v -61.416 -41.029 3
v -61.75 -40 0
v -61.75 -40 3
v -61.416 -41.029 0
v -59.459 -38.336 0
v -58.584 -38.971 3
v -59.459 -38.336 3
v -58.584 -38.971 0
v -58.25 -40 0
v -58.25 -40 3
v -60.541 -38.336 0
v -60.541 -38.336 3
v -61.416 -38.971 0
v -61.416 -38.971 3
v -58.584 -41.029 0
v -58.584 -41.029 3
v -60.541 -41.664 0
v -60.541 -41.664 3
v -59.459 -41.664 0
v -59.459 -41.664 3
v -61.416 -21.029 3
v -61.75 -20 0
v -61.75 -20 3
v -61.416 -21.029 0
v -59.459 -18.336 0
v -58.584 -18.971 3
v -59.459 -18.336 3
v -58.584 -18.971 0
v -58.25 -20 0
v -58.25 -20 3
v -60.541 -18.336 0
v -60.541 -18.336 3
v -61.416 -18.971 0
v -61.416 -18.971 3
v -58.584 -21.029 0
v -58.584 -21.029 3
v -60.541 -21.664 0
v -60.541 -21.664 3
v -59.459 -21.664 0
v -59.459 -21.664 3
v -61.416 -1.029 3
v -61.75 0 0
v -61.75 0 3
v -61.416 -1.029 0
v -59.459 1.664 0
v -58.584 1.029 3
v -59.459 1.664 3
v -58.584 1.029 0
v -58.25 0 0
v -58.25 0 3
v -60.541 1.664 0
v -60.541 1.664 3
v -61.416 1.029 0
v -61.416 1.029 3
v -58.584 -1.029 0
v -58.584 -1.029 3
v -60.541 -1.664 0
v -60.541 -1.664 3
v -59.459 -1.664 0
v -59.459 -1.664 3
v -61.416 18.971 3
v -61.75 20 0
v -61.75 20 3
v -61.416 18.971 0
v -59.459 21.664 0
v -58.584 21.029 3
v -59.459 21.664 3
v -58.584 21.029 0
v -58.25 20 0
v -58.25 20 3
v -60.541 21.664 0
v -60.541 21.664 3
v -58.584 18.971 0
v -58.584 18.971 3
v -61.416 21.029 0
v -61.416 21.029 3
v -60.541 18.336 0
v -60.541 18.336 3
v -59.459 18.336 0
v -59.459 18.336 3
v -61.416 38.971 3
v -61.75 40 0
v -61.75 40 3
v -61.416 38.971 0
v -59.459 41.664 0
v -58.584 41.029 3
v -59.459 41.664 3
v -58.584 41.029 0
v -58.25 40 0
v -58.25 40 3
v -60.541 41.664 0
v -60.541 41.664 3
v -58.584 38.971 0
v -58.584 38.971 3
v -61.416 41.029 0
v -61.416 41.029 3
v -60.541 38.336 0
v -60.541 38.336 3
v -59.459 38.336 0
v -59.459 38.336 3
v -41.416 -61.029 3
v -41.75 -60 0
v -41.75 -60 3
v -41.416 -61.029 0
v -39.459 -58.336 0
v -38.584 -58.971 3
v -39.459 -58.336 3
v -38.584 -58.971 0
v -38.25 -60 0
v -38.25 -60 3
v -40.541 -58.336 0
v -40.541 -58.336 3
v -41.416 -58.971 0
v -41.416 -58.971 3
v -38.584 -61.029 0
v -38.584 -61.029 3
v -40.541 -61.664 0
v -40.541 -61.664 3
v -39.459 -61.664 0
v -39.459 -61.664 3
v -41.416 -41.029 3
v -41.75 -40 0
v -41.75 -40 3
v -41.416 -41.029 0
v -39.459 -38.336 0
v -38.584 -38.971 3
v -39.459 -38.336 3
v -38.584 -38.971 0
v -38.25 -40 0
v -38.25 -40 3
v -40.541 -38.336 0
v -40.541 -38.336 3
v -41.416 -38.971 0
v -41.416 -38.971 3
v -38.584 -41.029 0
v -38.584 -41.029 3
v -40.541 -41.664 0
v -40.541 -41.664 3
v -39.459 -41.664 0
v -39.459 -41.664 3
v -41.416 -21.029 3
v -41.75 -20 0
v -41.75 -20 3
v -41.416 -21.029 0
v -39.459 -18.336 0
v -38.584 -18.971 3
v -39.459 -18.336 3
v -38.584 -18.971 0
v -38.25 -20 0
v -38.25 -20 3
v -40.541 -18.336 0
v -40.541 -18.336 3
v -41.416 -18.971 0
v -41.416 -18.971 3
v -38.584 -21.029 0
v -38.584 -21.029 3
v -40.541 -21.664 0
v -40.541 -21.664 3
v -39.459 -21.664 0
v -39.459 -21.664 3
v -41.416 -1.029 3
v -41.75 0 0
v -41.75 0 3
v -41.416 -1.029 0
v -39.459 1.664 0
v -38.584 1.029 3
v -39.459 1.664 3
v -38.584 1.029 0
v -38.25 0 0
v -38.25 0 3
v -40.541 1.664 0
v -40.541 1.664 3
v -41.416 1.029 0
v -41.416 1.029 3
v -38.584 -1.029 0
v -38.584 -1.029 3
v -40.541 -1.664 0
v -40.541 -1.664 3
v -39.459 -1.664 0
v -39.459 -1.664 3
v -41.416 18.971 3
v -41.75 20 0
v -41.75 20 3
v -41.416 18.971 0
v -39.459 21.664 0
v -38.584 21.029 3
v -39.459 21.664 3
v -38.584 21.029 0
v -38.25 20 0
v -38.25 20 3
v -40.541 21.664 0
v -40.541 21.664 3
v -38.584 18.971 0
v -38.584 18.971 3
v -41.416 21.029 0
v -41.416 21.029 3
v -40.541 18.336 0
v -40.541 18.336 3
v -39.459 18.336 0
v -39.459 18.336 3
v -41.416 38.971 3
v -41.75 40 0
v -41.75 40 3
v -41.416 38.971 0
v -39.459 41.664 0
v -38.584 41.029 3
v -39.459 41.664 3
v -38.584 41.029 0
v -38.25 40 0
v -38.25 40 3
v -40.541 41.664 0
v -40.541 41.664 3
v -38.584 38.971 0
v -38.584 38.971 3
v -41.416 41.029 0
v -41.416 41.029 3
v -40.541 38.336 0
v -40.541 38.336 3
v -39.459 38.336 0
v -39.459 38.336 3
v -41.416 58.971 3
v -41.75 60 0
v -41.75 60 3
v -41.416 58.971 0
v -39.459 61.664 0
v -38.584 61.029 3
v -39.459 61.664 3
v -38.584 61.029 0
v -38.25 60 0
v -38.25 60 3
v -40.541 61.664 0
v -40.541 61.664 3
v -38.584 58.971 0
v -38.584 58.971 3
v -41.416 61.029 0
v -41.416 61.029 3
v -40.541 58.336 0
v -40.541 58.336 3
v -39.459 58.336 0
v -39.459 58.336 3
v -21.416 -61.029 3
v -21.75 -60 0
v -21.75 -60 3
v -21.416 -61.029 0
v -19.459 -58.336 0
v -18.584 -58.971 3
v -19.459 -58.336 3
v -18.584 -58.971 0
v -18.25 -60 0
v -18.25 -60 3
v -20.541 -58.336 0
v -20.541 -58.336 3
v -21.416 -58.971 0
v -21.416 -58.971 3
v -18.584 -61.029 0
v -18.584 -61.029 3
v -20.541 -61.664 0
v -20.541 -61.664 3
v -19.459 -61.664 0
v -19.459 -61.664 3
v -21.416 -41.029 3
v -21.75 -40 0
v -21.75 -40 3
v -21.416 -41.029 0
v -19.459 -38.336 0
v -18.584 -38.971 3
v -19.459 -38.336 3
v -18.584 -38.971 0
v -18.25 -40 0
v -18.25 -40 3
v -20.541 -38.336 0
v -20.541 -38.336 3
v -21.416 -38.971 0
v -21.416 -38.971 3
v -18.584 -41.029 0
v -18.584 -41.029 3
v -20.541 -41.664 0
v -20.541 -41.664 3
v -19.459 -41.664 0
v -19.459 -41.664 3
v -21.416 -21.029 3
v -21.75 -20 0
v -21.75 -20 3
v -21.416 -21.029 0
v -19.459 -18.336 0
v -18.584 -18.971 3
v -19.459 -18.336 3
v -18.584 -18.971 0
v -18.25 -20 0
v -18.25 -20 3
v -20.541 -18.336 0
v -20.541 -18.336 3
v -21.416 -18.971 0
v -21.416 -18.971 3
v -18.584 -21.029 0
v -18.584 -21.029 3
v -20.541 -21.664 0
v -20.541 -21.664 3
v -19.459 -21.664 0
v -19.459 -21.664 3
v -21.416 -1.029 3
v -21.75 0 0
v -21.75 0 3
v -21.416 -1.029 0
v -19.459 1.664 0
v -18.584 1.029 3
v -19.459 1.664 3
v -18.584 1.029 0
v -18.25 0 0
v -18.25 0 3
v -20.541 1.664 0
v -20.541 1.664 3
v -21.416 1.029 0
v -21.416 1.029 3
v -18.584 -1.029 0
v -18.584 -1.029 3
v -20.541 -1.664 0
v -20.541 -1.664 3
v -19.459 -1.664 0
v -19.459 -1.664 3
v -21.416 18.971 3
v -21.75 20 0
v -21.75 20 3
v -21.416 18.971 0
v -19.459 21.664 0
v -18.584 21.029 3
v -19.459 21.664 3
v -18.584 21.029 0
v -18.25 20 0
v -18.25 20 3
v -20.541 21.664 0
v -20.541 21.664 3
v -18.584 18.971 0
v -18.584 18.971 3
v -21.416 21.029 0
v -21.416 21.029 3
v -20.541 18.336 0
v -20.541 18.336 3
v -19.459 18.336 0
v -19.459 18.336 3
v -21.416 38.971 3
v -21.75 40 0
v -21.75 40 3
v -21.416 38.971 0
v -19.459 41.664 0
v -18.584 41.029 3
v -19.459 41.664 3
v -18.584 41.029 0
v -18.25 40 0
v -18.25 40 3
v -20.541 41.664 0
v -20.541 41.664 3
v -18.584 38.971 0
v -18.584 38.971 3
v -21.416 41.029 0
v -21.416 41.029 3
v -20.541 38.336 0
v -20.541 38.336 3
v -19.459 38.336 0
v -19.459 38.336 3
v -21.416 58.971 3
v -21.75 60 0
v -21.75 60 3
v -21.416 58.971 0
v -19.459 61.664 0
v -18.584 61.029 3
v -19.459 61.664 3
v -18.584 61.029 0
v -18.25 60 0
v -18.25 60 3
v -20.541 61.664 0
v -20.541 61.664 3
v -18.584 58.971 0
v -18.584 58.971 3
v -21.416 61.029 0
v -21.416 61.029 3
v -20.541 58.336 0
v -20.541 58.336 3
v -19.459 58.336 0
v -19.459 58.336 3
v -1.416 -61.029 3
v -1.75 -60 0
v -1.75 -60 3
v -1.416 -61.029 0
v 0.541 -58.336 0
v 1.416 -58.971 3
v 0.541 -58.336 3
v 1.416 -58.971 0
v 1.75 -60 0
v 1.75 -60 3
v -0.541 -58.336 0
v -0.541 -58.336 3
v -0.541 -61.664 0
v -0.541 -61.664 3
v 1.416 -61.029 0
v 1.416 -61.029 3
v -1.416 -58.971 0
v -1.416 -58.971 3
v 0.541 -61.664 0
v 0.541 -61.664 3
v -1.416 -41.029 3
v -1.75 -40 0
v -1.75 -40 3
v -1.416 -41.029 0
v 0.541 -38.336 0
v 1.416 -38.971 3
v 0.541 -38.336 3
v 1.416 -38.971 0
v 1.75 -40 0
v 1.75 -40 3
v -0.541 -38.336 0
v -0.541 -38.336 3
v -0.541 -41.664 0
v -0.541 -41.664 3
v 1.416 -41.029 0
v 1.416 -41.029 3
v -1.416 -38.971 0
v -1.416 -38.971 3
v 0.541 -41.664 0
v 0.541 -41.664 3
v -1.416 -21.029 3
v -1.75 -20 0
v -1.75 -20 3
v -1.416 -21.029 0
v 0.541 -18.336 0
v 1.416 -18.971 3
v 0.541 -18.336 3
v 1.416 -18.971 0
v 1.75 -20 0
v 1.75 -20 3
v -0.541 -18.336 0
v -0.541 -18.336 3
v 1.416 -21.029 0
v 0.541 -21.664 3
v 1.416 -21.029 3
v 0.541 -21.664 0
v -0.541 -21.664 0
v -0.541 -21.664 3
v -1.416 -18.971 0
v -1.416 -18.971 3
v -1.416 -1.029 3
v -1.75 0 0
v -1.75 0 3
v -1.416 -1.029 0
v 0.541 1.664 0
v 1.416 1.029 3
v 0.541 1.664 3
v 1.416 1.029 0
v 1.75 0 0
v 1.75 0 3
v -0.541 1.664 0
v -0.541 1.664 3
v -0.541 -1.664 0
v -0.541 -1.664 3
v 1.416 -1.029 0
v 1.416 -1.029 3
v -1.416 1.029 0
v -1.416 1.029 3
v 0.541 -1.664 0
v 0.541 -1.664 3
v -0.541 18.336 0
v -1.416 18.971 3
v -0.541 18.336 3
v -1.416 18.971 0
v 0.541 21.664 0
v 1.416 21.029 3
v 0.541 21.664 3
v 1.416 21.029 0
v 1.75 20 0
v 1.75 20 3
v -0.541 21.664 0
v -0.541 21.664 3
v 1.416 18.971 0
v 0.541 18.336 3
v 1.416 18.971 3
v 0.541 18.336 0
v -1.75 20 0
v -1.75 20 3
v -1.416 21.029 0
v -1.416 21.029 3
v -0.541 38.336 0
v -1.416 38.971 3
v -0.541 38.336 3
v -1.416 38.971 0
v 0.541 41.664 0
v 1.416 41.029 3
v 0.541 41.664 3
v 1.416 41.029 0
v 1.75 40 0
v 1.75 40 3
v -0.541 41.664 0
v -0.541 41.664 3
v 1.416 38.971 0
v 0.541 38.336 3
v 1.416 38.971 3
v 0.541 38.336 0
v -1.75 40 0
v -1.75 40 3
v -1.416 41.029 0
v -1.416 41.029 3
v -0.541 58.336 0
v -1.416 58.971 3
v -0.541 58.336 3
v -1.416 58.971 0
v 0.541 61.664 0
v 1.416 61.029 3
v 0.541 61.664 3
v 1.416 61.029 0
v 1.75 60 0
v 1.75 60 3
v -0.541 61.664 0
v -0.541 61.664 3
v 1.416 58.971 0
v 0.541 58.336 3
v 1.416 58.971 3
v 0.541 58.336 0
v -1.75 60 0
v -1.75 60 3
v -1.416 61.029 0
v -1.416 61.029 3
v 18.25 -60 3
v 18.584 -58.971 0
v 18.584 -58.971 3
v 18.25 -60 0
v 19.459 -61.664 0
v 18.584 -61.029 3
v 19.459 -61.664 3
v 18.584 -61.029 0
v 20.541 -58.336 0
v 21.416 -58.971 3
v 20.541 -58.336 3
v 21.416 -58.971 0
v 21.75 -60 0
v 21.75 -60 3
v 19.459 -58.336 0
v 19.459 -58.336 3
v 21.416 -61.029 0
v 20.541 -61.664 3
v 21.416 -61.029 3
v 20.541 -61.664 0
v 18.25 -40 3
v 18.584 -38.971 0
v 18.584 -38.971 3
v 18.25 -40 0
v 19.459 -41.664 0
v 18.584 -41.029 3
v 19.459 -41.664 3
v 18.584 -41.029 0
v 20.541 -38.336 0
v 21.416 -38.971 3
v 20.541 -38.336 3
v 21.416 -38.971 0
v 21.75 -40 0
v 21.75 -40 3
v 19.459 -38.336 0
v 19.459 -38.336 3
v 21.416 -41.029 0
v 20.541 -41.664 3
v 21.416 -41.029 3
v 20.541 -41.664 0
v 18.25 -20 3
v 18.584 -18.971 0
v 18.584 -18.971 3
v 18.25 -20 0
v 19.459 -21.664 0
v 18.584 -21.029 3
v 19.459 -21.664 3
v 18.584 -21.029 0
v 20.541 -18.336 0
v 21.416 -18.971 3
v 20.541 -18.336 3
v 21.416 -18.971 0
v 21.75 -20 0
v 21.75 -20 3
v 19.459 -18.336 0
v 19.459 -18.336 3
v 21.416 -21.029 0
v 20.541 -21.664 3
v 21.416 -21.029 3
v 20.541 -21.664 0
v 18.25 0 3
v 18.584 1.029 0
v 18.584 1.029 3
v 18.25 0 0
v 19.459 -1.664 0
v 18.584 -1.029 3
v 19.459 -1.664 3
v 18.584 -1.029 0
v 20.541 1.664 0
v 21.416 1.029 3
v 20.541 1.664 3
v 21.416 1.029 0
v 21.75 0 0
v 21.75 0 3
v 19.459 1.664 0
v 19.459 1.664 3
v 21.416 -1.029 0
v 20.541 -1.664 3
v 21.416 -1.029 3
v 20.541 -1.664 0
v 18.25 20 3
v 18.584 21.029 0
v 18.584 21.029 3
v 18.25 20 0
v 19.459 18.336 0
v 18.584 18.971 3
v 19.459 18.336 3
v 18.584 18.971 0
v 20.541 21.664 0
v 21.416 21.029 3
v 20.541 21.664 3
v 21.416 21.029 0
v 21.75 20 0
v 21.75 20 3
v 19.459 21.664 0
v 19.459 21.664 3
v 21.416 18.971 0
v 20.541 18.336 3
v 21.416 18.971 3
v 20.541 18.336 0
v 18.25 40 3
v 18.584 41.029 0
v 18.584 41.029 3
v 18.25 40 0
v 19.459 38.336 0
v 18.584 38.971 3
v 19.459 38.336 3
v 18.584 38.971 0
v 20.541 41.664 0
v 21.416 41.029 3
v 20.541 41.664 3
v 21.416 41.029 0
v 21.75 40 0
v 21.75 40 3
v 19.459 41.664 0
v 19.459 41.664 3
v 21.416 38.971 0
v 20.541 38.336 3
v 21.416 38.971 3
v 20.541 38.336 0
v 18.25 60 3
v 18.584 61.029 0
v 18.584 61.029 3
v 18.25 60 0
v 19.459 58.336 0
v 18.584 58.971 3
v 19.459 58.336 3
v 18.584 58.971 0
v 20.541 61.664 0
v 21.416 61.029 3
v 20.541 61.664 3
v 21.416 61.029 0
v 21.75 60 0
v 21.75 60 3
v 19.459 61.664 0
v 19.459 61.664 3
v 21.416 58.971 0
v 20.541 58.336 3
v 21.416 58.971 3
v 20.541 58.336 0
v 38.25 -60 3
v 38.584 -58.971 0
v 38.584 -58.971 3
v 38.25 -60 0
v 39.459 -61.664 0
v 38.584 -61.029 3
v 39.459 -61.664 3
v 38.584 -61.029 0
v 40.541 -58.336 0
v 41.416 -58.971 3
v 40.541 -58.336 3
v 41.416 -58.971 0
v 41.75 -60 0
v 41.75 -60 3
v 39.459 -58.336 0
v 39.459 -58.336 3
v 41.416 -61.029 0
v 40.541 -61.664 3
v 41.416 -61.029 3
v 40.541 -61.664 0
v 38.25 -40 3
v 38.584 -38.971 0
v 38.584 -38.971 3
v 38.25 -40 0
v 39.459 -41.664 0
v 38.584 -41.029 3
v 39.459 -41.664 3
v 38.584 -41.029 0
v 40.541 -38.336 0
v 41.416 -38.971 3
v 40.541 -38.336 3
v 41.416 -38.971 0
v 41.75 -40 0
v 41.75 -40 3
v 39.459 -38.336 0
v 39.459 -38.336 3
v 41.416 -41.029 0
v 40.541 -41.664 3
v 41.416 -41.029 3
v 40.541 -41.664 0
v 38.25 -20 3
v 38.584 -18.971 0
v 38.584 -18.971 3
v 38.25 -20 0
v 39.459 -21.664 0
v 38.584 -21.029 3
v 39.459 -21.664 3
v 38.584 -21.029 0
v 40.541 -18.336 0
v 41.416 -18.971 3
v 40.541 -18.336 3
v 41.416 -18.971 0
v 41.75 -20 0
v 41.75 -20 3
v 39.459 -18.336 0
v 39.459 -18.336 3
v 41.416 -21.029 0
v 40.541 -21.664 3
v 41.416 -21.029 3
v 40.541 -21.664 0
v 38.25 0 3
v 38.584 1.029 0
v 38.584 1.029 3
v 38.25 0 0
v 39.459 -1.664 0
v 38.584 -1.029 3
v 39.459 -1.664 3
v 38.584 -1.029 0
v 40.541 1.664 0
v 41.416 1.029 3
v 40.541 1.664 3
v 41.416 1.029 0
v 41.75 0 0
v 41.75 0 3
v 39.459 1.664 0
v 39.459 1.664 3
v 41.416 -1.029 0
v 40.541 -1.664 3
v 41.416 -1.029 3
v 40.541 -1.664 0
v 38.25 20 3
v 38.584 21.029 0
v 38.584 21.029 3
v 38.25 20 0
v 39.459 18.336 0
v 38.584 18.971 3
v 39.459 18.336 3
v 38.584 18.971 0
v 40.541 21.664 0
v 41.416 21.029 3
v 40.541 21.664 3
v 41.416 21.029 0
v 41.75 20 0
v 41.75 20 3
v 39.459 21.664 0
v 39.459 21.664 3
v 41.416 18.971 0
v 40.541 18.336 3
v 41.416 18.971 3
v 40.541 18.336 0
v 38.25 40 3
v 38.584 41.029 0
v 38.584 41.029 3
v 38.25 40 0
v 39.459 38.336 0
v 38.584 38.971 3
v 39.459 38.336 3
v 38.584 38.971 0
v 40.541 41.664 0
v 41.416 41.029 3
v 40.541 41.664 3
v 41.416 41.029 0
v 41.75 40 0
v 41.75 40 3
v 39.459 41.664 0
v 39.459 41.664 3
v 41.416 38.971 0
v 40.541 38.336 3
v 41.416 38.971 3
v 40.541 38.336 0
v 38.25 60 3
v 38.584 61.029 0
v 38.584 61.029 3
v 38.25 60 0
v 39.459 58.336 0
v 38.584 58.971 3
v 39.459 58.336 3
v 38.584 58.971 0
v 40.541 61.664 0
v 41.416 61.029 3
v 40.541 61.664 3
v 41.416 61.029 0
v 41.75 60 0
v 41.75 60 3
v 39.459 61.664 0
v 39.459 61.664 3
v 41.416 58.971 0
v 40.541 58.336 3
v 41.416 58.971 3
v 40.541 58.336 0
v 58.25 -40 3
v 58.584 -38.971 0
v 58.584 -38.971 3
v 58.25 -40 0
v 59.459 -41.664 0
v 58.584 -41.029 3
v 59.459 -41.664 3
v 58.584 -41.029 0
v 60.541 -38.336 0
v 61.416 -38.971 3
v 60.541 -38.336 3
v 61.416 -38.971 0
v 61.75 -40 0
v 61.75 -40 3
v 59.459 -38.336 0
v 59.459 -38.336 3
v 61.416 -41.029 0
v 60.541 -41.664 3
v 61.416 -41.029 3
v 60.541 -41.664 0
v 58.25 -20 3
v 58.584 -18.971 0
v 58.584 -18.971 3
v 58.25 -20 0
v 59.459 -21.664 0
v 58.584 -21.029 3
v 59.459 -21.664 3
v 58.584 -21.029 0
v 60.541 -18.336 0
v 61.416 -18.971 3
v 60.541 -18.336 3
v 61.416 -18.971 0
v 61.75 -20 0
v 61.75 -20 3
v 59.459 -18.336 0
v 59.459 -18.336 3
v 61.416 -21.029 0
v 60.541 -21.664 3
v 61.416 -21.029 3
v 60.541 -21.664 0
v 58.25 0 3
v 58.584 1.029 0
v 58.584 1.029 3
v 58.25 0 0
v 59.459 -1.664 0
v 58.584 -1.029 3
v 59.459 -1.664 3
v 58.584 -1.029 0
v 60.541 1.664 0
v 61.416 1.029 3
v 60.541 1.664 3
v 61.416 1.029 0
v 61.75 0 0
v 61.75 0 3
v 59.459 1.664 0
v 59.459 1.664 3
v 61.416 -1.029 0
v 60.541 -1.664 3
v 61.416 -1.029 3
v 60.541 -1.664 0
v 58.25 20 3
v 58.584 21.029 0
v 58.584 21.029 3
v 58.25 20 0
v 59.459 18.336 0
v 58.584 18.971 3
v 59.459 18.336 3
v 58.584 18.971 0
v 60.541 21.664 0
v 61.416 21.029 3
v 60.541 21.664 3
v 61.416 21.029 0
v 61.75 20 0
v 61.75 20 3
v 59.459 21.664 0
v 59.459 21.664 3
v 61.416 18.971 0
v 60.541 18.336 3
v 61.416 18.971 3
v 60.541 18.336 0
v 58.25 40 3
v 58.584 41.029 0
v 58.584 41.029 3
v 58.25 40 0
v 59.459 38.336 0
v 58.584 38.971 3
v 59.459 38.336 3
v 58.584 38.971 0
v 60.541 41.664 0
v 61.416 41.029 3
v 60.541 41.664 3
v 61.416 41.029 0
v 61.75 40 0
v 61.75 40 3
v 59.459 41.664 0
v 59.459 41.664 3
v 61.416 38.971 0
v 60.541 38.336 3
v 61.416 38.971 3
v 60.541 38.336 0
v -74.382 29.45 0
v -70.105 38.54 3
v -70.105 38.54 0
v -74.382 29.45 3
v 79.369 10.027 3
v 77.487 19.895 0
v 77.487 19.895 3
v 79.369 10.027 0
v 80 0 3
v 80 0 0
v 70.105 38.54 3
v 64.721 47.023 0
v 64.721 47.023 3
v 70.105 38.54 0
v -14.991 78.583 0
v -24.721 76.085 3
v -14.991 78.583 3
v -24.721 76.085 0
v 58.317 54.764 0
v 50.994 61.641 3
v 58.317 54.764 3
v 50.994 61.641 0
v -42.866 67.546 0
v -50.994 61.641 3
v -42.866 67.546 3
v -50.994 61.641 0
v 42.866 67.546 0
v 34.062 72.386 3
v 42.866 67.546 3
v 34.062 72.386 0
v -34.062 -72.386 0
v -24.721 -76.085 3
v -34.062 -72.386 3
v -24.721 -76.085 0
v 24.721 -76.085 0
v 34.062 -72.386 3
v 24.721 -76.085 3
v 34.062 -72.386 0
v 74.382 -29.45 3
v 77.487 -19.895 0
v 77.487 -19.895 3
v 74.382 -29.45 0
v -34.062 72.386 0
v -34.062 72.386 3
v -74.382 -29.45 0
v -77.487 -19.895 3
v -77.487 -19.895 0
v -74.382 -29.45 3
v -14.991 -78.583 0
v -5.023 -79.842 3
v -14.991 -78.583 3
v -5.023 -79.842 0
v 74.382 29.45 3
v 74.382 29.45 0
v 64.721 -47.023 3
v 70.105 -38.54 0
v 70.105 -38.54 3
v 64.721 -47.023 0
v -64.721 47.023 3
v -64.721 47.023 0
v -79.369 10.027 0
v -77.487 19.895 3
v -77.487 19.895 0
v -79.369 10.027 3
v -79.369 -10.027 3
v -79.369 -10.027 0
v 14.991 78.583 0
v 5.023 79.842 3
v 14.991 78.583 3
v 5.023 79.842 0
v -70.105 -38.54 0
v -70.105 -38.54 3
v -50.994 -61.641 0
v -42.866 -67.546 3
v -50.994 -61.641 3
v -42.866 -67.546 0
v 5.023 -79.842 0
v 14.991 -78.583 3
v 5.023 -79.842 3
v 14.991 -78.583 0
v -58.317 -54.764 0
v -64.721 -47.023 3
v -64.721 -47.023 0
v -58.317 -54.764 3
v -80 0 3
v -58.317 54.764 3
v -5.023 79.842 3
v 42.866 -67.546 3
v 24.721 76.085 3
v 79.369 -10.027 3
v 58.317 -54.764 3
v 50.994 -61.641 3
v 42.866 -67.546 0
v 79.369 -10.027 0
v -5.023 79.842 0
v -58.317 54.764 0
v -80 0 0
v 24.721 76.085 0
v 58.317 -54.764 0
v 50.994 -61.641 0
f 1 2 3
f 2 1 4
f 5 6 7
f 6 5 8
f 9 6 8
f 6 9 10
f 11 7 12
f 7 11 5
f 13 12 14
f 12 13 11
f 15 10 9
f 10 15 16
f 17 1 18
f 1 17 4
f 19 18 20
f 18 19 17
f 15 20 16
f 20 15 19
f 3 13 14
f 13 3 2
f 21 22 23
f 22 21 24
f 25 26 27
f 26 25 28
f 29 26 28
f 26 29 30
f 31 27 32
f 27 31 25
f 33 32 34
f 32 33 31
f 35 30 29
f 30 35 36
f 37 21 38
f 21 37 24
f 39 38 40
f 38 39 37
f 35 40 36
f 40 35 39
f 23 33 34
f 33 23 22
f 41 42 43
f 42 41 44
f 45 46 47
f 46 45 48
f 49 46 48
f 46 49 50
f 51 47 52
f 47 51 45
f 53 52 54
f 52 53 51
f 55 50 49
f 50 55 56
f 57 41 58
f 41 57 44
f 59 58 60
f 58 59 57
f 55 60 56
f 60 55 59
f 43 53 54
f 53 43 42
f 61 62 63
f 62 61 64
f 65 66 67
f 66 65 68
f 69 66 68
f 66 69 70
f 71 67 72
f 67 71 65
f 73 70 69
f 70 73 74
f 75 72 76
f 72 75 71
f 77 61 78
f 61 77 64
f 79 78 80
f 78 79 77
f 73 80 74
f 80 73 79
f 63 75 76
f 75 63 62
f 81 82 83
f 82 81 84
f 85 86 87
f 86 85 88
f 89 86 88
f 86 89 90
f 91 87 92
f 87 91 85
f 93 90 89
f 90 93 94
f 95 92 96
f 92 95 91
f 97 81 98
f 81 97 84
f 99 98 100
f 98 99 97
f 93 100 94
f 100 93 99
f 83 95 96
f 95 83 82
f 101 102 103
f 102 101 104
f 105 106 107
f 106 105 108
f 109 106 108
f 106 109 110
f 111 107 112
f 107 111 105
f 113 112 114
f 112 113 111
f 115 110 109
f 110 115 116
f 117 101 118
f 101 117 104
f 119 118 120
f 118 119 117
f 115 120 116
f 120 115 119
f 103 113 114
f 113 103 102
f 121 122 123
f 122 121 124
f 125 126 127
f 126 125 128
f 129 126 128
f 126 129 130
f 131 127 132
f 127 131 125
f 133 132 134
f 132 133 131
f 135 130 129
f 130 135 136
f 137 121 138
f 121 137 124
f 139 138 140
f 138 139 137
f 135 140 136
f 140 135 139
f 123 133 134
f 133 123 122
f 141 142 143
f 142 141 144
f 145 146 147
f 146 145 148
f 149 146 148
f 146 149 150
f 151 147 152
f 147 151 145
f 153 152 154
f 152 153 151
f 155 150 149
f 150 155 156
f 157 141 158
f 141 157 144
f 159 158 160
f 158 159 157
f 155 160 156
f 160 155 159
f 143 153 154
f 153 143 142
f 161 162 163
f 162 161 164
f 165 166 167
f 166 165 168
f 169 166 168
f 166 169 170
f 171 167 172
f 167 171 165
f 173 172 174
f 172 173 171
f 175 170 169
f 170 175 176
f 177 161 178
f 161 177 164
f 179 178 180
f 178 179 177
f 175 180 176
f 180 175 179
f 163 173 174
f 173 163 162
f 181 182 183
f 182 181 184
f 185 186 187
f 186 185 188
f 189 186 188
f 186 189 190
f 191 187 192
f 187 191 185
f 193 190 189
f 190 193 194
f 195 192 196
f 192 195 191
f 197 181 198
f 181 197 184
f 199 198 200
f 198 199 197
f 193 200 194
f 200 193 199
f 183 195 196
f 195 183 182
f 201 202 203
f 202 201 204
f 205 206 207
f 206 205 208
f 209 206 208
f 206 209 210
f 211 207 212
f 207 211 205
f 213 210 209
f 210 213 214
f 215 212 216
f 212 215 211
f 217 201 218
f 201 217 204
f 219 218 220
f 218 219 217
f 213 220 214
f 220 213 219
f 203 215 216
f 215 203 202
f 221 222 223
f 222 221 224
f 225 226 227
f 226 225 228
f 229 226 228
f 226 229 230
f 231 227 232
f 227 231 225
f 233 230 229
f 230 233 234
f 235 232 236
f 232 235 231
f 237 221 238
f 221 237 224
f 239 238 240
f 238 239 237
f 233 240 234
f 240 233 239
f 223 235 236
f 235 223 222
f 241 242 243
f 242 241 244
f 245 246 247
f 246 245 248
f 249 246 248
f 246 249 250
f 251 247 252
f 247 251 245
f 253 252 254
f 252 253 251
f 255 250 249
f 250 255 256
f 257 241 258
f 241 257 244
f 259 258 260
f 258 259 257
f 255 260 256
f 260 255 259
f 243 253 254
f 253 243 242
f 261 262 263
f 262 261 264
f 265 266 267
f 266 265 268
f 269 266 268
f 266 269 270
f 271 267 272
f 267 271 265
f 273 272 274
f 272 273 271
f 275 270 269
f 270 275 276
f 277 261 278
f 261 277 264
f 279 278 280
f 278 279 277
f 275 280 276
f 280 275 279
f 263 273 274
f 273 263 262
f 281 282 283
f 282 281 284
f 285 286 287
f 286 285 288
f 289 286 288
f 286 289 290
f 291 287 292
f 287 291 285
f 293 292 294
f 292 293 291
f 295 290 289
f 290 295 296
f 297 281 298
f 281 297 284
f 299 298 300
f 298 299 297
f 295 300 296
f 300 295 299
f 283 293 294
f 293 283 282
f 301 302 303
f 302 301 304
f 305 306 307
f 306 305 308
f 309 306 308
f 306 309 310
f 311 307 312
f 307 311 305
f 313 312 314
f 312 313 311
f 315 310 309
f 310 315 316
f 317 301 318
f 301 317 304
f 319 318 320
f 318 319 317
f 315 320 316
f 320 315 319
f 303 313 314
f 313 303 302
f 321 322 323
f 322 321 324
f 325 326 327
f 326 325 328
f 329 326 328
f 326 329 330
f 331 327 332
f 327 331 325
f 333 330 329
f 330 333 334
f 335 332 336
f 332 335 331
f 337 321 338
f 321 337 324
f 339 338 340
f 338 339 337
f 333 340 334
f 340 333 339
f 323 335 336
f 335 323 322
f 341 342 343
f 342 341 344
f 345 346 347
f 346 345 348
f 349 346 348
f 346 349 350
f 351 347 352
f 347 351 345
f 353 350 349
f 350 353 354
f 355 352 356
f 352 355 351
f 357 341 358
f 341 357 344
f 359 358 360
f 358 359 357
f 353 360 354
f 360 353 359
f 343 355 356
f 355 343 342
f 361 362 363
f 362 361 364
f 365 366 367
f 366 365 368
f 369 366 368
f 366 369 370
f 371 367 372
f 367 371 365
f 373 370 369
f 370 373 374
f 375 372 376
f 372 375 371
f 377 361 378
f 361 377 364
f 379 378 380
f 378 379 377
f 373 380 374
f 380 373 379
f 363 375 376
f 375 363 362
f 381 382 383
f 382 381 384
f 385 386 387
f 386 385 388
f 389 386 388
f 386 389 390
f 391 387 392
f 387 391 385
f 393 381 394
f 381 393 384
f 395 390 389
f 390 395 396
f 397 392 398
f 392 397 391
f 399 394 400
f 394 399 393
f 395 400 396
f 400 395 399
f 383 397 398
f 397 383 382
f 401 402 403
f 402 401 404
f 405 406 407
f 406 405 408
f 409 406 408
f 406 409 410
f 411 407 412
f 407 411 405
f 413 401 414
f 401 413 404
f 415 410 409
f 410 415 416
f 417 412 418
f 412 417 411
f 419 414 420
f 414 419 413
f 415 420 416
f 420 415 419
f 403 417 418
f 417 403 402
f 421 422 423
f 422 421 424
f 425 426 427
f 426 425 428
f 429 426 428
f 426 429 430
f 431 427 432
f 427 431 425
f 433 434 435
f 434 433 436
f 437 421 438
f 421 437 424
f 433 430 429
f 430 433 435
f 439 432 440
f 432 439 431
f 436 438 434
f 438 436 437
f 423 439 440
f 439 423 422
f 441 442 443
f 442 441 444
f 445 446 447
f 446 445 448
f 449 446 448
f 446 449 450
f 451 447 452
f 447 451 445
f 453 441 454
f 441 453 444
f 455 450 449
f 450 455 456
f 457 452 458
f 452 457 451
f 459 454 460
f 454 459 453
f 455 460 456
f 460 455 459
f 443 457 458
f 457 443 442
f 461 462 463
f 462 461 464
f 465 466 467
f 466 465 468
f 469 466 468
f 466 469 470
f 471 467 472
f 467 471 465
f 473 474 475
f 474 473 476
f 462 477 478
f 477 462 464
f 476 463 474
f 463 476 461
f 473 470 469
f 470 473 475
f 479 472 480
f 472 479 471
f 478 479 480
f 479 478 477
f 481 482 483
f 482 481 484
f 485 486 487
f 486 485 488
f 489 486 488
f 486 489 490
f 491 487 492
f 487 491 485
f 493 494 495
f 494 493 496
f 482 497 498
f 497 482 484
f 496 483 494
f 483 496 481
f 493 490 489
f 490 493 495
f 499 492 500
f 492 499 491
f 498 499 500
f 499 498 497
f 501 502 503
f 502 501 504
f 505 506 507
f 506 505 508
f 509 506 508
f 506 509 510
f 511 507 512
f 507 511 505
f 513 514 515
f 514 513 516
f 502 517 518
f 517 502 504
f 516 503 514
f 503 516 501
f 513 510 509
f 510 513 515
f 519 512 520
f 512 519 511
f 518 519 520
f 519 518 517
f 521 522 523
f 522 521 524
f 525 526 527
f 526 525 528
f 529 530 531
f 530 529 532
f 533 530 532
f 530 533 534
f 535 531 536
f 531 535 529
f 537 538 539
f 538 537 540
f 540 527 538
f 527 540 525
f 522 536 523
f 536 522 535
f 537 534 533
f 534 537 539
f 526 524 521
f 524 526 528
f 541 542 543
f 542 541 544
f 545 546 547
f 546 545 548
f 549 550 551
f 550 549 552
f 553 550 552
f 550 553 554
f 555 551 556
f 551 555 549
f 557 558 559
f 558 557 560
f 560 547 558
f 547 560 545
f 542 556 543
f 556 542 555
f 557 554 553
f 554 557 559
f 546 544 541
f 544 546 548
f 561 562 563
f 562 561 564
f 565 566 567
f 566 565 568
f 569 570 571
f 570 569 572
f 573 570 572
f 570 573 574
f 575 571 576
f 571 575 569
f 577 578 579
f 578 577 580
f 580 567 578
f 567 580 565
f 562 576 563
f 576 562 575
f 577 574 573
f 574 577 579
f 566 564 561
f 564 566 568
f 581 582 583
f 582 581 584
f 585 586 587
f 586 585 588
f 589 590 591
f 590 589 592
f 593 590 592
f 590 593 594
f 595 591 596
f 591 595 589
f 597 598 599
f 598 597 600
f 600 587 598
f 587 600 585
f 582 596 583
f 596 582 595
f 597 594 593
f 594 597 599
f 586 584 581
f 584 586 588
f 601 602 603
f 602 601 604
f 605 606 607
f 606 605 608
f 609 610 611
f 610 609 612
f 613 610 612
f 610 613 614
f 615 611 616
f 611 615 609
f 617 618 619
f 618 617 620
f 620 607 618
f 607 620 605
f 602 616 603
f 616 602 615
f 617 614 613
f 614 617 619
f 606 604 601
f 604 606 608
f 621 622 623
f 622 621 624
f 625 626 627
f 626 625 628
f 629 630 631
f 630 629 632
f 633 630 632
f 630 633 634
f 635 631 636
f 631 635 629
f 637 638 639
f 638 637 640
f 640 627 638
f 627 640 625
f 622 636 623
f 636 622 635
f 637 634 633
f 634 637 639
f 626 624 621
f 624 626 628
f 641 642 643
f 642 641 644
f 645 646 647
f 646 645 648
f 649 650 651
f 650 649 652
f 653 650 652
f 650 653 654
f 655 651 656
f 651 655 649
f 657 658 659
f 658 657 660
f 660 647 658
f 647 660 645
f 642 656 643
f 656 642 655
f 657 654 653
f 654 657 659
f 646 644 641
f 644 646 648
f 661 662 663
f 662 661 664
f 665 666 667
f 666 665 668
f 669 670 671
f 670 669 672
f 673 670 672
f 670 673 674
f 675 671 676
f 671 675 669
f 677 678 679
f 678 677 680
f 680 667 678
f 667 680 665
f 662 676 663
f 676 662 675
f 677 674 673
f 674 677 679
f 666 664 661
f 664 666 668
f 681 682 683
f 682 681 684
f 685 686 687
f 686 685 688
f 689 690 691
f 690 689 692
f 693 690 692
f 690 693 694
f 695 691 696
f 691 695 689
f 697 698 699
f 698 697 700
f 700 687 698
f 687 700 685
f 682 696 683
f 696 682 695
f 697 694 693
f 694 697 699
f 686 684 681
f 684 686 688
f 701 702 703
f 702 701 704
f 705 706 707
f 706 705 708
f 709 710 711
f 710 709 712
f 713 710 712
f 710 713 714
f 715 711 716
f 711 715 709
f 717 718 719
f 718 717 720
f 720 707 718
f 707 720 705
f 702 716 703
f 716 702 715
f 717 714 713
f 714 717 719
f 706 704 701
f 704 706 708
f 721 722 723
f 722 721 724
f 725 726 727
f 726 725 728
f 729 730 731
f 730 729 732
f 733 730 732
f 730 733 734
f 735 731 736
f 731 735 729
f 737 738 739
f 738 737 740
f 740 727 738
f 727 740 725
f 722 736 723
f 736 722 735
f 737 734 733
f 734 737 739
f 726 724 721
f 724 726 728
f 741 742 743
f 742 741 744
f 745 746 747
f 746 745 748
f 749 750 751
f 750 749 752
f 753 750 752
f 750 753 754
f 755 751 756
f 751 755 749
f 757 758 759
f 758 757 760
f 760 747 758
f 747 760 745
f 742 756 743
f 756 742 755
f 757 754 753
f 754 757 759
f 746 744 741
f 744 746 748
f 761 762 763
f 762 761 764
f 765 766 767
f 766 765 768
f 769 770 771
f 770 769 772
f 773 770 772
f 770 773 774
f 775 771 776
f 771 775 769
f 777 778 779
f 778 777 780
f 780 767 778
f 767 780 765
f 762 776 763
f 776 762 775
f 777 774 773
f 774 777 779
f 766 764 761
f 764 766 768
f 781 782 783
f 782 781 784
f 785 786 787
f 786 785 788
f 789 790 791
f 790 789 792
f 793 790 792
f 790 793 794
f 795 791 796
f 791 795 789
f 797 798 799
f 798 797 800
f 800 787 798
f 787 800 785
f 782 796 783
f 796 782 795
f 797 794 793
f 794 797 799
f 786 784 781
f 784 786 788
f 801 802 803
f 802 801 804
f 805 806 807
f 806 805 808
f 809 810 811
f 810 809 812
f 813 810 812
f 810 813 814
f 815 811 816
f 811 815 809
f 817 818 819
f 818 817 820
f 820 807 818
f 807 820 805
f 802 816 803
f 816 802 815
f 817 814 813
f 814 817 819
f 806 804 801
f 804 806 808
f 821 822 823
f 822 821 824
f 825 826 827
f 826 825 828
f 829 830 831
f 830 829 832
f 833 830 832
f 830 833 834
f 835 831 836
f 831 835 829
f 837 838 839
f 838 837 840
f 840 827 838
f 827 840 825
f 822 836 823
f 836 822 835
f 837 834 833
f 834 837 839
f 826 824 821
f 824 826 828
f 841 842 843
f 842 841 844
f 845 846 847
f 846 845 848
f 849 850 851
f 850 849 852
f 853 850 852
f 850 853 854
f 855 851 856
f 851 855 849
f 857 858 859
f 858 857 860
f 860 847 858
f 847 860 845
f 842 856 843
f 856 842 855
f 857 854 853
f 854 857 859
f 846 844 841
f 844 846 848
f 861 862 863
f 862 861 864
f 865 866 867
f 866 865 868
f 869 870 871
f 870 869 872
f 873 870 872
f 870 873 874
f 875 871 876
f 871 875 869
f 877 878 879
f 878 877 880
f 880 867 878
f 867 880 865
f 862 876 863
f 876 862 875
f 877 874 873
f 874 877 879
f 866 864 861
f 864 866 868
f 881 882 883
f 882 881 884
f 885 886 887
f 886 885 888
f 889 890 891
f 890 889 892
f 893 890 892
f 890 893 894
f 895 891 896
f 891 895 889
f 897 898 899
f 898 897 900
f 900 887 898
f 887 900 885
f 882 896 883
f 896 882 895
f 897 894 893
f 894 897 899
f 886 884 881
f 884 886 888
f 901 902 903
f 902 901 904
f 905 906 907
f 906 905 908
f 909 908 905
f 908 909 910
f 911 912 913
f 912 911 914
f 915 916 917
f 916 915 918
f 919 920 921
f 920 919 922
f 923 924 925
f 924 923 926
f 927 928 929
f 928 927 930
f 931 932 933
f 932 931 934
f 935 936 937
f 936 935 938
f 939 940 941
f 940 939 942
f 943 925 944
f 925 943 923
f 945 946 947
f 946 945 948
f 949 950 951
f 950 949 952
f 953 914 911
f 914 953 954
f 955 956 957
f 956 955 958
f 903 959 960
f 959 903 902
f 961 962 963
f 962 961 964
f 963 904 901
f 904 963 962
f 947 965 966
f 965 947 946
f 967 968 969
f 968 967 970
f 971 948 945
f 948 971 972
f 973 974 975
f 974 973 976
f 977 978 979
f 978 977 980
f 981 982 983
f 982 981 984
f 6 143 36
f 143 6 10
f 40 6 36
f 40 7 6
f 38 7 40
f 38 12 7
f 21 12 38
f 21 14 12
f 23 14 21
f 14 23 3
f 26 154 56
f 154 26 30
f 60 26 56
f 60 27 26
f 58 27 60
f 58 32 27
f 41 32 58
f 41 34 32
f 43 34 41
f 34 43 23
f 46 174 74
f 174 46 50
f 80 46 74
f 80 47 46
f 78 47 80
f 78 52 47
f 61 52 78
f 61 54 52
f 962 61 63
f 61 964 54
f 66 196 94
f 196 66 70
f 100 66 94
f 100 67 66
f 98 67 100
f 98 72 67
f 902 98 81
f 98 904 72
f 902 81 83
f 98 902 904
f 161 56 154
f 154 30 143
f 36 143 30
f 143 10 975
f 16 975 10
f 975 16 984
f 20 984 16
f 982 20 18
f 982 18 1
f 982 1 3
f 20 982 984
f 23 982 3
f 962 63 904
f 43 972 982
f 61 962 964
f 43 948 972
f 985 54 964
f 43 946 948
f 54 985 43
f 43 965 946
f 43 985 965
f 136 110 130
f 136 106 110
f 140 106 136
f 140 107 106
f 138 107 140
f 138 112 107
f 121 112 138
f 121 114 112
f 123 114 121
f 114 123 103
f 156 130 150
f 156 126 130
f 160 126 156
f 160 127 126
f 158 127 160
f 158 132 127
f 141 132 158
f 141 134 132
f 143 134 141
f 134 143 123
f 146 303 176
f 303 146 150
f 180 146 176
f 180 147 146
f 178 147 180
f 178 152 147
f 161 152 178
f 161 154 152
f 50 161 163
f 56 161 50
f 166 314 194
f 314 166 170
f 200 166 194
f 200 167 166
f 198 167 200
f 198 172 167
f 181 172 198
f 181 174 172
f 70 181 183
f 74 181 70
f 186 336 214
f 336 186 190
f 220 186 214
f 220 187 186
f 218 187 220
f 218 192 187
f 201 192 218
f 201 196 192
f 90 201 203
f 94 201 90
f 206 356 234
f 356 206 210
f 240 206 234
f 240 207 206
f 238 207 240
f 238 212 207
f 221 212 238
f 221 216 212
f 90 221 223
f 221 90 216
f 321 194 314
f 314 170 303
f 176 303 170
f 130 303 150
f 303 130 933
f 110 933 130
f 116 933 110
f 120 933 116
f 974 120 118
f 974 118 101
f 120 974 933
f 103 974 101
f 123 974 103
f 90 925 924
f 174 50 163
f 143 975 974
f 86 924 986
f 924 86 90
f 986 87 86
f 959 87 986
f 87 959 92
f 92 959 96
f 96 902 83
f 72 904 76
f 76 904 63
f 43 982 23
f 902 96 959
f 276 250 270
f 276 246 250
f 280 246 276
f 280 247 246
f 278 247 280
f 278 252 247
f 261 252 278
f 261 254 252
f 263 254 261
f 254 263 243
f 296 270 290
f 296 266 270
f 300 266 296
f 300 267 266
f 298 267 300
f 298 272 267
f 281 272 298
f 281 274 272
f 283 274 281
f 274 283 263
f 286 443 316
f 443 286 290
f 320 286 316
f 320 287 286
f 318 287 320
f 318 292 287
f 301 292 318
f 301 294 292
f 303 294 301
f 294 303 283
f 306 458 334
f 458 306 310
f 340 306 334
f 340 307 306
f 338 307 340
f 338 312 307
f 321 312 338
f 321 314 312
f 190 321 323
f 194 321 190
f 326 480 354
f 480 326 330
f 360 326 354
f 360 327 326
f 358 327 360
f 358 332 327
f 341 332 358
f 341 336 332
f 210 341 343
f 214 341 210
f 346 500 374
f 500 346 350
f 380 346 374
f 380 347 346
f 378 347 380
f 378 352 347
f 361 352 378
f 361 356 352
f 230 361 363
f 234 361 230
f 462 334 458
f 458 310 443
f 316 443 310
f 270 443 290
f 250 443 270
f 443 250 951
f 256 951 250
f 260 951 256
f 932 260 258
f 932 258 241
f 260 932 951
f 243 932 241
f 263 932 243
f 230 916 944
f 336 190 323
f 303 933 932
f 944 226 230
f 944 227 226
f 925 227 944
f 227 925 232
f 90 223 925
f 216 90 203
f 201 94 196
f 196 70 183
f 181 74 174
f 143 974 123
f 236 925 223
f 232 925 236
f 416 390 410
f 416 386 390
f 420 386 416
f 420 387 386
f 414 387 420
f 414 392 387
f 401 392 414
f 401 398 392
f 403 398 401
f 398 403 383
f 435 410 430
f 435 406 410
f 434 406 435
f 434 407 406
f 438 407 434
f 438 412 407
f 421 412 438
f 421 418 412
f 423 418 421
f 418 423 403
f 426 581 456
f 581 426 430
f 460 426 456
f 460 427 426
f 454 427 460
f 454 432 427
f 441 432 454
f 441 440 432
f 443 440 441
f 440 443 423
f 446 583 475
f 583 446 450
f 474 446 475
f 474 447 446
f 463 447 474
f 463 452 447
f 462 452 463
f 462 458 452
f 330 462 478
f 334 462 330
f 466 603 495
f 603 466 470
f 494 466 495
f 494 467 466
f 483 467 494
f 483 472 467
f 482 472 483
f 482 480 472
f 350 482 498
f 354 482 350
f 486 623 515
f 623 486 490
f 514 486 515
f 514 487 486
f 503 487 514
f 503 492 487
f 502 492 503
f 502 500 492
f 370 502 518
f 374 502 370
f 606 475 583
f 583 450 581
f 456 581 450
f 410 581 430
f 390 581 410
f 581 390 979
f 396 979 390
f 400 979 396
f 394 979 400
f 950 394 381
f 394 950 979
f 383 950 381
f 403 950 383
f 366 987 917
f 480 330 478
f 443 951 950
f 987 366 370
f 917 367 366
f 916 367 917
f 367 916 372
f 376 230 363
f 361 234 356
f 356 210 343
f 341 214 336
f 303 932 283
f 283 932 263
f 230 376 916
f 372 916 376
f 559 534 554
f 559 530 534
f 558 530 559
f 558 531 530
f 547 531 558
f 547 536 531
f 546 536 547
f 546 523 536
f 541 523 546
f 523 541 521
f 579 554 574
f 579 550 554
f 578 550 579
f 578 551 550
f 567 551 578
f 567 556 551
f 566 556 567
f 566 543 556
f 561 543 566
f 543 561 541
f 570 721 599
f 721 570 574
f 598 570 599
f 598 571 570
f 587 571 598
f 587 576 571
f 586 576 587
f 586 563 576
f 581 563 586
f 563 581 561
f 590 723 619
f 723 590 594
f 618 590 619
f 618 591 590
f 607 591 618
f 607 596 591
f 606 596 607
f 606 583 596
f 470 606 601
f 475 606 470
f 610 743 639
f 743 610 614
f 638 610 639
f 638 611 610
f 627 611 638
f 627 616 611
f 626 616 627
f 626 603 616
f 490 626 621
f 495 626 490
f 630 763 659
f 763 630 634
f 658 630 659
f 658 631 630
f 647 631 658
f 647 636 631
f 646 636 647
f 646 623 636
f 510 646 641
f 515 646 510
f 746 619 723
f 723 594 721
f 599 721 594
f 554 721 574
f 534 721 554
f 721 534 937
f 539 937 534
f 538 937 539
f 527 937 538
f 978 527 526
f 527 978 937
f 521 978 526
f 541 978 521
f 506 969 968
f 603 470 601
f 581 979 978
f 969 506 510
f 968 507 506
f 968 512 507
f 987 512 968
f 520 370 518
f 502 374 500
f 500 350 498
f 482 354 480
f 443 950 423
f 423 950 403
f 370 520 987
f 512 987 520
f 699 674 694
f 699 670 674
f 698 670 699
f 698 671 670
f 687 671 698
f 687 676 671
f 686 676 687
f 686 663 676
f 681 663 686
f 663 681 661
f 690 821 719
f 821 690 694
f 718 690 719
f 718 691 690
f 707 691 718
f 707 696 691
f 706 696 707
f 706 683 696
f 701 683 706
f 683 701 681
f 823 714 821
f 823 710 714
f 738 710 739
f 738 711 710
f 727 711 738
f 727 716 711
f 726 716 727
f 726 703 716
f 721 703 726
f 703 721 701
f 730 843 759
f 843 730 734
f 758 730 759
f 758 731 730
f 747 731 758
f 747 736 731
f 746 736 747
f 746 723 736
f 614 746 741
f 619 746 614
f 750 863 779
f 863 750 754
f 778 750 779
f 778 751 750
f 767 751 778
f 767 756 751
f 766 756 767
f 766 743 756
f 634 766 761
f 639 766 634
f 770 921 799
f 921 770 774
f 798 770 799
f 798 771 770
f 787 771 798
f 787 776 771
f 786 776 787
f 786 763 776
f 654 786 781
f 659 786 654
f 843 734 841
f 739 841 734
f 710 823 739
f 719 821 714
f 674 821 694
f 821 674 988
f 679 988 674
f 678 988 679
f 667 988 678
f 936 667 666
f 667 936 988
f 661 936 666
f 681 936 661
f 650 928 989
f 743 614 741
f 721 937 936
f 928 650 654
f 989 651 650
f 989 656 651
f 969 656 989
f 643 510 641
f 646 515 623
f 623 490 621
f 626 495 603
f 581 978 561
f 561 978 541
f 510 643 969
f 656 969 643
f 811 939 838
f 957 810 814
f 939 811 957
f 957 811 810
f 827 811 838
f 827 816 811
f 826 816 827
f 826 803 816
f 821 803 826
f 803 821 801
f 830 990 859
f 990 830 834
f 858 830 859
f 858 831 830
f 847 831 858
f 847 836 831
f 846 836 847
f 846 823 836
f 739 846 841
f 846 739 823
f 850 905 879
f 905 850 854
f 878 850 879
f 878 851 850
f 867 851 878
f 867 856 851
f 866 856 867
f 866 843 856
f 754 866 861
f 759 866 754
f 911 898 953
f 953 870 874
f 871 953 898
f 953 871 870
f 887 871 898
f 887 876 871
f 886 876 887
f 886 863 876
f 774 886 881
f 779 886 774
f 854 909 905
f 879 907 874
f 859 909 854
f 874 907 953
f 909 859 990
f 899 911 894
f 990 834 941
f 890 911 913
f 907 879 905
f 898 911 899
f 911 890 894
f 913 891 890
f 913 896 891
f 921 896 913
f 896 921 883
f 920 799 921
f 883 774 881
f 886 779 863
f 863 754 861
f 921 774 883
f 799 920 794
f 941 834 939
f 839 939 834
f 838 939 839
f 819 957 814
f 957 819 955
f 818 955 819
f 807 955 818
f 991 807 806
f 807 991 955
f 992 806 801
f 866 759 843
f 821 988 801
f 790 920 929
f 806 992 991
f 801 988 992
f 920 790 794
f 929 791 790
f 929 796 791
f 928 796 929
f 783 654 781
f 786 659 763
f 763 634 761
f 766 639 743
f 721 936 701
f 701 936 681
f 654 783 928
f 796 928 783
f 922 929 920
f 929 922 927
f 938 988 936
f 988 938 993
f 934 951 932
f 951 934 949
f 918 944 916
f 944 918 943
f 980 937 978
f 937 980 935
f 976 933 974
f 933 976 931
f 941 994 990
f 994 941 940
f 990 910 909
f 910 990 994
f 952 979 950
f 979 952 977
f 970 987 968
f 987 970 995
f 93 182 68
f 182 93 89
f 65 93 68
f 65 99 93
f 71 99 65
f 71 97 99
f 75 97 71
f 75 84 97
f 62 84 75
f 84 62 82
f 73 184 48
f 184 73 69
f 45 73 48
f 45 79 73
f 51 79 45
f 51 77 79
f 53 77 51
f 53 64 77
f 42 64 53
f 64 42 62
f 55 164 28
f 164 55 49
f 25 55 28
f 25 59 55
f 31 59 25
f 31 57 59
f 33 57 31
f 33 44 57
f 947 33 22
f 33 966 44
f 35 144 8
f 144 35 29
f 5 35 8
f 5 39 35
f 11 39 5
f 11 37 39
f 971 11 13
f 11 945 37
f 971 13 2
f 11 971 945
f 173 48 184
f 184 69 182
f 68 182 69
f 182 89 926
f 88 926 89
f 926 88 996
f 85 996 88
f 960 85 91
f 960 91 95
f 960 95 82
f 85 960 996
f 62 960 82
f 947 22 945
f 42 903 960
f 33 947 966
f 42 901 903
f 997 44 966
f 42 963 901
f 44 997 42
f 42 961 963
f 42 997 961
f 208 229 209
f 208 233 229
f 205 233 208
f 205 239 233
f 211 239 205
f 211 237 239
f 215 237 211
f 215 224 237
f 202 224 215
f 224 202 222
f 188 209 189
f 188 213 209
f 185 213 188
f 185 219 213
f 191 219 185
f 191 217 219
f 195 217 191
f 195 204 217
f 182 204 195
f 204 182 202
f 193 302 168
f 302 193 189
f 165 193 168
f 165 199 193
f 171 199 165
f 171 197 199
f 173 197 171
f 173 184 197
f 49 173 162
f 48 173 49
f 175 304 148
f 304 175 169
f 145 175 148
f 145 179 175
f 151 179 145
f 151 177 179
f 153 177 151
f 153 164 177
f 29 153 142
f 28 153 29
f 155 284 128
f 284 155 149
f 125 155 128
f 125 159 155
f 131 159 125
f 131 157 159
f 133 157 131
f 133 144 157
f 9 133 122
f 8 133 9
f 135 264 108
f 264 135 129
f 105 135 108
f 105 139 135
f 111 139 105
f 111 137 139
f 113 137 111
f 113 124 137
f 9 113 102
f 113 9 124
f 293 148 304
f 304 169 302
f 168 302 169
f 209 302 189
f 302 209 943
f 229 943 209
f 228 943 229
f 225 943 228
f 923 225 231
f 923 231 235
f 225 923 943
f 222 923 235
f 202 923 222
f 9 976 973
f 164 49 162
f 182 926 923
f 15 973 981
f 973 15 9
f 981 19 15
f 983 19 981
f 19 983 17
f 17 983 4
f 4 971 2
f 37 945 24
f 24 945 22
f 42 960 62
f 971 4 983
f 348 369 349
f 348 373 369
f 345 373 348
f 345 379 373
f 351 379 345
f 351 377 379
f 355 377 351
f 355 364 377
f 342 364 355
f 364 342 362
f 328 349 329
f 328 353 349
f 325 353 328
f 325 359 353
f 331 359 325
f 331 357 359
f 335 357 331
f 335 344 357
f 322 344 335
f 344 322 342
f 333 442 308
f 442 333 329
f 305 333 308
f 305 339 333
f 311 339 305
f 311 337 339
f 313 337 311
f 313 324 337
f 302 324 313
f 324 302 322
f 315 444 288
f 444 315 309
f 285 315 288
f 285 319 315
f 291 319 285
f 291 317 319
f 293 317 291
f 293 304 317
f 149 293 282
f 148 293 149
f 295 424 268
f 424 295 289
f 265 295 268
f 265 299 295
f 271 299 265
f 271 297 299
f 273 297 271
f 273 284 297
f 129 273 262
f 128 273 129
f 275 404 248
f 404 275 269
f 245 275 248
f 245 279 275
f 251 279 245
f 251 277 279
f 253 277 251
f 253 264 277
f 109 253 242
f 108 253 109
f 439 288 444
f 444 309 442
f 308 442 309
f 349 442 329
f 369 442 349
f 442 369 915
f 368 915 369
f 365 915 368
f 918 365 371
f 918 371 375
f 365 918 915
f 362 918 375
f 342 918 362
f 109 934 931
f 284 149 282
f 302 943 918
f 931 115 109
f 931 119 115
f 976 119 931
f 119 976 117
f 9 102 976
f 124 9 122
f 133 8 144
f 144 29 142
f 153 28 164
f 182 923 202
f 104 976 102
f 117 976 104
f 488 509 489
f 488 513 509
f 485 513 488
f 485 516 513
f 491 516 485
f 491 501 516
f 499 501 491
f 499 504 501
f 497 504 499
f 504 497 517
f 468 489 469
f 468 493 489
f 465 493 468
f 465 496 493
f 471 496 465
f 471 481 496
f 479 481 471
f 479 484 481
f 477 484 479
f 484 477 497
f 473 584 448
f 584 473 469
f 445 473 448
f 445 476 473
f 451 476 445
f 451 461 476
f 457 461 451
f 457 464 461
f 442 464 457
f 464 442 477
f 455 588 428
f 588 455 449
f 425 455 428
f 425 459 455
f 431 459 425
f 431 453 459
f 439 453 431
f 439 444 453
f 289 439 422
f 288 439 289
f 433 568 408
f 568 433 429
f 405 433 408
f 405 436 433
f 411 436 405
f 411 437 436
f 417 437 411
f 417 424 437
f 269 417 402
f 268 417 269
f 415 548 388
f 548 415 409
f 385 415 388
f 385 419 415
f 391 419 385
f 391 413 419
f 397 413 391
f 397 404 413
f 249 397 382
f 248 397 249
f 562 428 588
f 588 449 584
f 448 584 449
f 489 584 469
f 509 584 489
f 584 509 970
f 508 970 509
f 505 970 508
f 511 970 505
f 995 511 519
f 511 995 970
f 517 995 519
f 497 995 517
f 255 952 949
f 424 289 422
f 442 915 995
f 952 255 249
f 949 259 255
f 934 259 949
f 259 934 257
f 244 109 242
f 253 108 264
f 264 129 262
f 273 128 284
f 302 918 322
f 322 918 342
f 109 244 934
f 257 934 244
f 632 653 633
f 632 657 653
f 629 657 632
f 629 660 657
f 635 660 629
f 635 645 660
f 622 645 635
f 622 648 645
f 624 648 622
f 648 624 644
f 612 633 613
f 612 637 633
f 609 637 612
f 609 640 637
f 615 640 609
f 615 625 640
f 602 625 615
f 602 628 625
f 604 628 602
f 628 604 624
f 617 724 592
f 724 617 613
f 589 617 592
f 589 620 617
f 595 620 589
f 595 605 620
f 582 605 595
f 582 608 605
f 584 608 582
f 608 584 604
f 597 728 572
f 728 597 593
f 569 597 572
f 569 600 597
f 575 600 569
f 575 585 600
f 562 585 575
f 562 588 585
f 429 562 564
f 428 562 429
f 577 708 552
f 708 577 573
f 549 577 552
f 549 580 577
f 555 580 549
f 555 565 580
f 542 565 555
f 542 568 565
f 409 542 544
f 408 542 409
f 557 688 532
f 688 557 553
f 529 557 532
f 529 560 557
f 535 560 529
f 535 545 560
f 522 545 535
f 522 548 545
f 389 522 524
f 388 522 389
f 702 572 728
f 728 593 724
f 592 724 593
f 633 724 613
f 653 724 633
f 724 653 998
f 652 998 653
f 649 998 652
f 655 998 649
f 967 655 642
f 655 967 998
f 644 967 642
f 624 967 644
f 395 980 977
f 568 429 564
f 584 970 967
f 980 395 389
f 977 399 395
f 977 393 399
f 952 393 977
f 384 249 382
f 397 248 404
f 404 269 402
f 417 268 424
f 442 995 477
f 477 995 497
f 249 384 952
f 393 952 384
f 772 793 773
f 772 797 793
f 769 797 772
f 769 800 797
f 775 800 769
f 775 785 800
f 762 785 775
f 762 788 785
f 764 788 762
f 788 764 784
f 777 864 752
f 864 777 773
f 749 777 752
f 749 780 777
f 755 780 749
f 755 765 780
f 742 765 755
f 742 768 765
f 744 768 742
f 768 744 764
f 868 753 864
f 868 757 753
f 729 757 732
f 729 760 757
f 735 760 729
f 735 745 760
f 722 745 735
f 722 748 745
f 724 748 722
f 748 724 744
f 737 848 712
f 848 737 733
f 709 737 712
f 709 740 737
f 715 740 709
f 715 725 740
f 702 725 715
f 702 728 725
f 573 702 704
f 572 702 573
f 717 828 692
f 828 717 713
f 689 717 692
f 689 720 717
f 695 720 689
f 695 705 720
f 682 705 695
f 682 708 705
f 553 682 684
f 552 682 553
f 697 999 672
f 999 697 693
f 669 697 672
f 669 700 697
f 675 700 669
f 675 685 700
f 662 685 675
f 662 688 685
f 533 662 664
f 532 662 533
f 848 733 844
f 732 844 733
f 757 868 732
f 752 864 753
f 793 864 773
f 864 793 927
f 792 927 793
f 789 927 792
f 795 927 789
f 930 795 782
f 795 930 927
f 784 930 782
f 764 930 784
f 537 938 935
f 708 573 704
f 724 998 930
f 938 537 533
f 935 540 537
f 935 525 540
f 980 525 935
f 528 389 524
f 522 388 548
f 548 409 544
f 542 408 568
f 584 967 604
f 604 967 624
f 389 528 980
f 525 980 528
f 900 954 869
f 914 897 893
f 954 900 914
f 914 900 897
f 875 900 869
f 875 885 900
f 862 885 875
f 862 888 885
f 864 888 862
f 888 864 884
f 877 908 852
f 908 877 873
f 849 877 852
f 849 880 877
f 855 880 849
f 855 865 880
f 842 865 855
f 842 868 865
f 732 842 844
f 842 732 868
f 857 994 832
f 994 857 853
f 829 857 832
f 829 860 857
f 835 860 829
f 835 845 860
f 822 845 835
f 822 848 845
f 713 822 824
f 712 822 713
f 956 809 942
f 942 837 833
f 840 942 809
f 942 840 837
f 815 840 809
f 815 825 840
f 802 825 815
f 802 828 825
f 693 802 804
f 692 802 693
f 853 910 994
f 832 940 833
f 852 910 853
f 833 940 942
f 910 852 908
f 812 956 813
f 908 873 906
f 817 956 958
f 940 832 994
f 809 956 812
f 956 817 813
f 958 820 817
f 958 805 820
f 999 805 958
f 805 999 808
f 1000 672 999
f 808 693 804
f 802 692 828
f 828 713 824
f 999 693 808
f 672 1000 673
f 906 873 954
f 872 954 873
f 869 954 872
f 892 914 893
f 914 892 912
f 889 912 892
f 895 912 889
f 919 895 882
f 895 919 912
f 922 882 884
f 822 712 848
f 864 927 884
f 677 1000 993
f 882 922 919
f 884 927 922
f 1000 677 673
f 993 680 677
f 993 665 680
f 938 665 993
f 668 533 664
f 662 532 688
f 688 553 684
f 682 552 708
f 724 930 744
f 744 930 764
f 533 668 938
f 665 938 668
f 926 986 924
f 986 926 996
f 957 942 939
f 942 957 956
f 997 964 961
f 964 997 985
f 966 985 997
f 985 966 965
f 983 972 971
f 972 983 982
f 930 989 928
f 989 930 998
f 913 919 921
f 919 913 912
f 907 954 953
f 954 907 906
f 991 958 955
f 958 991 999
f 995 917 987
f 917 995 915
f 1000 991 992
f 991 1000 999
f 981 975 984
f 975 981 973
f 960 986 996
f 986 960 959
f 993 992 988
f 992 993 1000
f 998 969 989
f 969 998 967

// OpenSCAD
// Parameters
plate_diameter = 160;
plate_thickness = 3;
hole_diameter = 3.5; // ORP rules
hole_spacing = 20; // ORP rules
plate_resolution = 50; 
hole_resolution = 10; 

num_holes_x = floor(plate_diameter / hole_spacing);
num_holes_y = floor(plate_diameter / hole_spacing);

difference() {
    cylinder(h = plate_thickness, d = plate_diameter, $fn=plate_resolution);

    for (i = [-floor(plate_diameter / hole_spacing / 2):floor(plate_diameter / hole_spacing / 2)]) {
        for (j = [-floor(plate_diameter / hole_spacing / 2):floor(plate_diameter / hole_spacing / 2)]) {
            x = i * hole_spacing;
            y = j * hole_spacing;
            if (sqrt(x*x + y*y) + hole_diameter/2 <= plate_diameter/2) {
                translate([x, y, -1])
                    cylinder(h = plate_thickness + 2, d = hole_diameter, $fn=hole_resolution);
            }
        }
    }
}
